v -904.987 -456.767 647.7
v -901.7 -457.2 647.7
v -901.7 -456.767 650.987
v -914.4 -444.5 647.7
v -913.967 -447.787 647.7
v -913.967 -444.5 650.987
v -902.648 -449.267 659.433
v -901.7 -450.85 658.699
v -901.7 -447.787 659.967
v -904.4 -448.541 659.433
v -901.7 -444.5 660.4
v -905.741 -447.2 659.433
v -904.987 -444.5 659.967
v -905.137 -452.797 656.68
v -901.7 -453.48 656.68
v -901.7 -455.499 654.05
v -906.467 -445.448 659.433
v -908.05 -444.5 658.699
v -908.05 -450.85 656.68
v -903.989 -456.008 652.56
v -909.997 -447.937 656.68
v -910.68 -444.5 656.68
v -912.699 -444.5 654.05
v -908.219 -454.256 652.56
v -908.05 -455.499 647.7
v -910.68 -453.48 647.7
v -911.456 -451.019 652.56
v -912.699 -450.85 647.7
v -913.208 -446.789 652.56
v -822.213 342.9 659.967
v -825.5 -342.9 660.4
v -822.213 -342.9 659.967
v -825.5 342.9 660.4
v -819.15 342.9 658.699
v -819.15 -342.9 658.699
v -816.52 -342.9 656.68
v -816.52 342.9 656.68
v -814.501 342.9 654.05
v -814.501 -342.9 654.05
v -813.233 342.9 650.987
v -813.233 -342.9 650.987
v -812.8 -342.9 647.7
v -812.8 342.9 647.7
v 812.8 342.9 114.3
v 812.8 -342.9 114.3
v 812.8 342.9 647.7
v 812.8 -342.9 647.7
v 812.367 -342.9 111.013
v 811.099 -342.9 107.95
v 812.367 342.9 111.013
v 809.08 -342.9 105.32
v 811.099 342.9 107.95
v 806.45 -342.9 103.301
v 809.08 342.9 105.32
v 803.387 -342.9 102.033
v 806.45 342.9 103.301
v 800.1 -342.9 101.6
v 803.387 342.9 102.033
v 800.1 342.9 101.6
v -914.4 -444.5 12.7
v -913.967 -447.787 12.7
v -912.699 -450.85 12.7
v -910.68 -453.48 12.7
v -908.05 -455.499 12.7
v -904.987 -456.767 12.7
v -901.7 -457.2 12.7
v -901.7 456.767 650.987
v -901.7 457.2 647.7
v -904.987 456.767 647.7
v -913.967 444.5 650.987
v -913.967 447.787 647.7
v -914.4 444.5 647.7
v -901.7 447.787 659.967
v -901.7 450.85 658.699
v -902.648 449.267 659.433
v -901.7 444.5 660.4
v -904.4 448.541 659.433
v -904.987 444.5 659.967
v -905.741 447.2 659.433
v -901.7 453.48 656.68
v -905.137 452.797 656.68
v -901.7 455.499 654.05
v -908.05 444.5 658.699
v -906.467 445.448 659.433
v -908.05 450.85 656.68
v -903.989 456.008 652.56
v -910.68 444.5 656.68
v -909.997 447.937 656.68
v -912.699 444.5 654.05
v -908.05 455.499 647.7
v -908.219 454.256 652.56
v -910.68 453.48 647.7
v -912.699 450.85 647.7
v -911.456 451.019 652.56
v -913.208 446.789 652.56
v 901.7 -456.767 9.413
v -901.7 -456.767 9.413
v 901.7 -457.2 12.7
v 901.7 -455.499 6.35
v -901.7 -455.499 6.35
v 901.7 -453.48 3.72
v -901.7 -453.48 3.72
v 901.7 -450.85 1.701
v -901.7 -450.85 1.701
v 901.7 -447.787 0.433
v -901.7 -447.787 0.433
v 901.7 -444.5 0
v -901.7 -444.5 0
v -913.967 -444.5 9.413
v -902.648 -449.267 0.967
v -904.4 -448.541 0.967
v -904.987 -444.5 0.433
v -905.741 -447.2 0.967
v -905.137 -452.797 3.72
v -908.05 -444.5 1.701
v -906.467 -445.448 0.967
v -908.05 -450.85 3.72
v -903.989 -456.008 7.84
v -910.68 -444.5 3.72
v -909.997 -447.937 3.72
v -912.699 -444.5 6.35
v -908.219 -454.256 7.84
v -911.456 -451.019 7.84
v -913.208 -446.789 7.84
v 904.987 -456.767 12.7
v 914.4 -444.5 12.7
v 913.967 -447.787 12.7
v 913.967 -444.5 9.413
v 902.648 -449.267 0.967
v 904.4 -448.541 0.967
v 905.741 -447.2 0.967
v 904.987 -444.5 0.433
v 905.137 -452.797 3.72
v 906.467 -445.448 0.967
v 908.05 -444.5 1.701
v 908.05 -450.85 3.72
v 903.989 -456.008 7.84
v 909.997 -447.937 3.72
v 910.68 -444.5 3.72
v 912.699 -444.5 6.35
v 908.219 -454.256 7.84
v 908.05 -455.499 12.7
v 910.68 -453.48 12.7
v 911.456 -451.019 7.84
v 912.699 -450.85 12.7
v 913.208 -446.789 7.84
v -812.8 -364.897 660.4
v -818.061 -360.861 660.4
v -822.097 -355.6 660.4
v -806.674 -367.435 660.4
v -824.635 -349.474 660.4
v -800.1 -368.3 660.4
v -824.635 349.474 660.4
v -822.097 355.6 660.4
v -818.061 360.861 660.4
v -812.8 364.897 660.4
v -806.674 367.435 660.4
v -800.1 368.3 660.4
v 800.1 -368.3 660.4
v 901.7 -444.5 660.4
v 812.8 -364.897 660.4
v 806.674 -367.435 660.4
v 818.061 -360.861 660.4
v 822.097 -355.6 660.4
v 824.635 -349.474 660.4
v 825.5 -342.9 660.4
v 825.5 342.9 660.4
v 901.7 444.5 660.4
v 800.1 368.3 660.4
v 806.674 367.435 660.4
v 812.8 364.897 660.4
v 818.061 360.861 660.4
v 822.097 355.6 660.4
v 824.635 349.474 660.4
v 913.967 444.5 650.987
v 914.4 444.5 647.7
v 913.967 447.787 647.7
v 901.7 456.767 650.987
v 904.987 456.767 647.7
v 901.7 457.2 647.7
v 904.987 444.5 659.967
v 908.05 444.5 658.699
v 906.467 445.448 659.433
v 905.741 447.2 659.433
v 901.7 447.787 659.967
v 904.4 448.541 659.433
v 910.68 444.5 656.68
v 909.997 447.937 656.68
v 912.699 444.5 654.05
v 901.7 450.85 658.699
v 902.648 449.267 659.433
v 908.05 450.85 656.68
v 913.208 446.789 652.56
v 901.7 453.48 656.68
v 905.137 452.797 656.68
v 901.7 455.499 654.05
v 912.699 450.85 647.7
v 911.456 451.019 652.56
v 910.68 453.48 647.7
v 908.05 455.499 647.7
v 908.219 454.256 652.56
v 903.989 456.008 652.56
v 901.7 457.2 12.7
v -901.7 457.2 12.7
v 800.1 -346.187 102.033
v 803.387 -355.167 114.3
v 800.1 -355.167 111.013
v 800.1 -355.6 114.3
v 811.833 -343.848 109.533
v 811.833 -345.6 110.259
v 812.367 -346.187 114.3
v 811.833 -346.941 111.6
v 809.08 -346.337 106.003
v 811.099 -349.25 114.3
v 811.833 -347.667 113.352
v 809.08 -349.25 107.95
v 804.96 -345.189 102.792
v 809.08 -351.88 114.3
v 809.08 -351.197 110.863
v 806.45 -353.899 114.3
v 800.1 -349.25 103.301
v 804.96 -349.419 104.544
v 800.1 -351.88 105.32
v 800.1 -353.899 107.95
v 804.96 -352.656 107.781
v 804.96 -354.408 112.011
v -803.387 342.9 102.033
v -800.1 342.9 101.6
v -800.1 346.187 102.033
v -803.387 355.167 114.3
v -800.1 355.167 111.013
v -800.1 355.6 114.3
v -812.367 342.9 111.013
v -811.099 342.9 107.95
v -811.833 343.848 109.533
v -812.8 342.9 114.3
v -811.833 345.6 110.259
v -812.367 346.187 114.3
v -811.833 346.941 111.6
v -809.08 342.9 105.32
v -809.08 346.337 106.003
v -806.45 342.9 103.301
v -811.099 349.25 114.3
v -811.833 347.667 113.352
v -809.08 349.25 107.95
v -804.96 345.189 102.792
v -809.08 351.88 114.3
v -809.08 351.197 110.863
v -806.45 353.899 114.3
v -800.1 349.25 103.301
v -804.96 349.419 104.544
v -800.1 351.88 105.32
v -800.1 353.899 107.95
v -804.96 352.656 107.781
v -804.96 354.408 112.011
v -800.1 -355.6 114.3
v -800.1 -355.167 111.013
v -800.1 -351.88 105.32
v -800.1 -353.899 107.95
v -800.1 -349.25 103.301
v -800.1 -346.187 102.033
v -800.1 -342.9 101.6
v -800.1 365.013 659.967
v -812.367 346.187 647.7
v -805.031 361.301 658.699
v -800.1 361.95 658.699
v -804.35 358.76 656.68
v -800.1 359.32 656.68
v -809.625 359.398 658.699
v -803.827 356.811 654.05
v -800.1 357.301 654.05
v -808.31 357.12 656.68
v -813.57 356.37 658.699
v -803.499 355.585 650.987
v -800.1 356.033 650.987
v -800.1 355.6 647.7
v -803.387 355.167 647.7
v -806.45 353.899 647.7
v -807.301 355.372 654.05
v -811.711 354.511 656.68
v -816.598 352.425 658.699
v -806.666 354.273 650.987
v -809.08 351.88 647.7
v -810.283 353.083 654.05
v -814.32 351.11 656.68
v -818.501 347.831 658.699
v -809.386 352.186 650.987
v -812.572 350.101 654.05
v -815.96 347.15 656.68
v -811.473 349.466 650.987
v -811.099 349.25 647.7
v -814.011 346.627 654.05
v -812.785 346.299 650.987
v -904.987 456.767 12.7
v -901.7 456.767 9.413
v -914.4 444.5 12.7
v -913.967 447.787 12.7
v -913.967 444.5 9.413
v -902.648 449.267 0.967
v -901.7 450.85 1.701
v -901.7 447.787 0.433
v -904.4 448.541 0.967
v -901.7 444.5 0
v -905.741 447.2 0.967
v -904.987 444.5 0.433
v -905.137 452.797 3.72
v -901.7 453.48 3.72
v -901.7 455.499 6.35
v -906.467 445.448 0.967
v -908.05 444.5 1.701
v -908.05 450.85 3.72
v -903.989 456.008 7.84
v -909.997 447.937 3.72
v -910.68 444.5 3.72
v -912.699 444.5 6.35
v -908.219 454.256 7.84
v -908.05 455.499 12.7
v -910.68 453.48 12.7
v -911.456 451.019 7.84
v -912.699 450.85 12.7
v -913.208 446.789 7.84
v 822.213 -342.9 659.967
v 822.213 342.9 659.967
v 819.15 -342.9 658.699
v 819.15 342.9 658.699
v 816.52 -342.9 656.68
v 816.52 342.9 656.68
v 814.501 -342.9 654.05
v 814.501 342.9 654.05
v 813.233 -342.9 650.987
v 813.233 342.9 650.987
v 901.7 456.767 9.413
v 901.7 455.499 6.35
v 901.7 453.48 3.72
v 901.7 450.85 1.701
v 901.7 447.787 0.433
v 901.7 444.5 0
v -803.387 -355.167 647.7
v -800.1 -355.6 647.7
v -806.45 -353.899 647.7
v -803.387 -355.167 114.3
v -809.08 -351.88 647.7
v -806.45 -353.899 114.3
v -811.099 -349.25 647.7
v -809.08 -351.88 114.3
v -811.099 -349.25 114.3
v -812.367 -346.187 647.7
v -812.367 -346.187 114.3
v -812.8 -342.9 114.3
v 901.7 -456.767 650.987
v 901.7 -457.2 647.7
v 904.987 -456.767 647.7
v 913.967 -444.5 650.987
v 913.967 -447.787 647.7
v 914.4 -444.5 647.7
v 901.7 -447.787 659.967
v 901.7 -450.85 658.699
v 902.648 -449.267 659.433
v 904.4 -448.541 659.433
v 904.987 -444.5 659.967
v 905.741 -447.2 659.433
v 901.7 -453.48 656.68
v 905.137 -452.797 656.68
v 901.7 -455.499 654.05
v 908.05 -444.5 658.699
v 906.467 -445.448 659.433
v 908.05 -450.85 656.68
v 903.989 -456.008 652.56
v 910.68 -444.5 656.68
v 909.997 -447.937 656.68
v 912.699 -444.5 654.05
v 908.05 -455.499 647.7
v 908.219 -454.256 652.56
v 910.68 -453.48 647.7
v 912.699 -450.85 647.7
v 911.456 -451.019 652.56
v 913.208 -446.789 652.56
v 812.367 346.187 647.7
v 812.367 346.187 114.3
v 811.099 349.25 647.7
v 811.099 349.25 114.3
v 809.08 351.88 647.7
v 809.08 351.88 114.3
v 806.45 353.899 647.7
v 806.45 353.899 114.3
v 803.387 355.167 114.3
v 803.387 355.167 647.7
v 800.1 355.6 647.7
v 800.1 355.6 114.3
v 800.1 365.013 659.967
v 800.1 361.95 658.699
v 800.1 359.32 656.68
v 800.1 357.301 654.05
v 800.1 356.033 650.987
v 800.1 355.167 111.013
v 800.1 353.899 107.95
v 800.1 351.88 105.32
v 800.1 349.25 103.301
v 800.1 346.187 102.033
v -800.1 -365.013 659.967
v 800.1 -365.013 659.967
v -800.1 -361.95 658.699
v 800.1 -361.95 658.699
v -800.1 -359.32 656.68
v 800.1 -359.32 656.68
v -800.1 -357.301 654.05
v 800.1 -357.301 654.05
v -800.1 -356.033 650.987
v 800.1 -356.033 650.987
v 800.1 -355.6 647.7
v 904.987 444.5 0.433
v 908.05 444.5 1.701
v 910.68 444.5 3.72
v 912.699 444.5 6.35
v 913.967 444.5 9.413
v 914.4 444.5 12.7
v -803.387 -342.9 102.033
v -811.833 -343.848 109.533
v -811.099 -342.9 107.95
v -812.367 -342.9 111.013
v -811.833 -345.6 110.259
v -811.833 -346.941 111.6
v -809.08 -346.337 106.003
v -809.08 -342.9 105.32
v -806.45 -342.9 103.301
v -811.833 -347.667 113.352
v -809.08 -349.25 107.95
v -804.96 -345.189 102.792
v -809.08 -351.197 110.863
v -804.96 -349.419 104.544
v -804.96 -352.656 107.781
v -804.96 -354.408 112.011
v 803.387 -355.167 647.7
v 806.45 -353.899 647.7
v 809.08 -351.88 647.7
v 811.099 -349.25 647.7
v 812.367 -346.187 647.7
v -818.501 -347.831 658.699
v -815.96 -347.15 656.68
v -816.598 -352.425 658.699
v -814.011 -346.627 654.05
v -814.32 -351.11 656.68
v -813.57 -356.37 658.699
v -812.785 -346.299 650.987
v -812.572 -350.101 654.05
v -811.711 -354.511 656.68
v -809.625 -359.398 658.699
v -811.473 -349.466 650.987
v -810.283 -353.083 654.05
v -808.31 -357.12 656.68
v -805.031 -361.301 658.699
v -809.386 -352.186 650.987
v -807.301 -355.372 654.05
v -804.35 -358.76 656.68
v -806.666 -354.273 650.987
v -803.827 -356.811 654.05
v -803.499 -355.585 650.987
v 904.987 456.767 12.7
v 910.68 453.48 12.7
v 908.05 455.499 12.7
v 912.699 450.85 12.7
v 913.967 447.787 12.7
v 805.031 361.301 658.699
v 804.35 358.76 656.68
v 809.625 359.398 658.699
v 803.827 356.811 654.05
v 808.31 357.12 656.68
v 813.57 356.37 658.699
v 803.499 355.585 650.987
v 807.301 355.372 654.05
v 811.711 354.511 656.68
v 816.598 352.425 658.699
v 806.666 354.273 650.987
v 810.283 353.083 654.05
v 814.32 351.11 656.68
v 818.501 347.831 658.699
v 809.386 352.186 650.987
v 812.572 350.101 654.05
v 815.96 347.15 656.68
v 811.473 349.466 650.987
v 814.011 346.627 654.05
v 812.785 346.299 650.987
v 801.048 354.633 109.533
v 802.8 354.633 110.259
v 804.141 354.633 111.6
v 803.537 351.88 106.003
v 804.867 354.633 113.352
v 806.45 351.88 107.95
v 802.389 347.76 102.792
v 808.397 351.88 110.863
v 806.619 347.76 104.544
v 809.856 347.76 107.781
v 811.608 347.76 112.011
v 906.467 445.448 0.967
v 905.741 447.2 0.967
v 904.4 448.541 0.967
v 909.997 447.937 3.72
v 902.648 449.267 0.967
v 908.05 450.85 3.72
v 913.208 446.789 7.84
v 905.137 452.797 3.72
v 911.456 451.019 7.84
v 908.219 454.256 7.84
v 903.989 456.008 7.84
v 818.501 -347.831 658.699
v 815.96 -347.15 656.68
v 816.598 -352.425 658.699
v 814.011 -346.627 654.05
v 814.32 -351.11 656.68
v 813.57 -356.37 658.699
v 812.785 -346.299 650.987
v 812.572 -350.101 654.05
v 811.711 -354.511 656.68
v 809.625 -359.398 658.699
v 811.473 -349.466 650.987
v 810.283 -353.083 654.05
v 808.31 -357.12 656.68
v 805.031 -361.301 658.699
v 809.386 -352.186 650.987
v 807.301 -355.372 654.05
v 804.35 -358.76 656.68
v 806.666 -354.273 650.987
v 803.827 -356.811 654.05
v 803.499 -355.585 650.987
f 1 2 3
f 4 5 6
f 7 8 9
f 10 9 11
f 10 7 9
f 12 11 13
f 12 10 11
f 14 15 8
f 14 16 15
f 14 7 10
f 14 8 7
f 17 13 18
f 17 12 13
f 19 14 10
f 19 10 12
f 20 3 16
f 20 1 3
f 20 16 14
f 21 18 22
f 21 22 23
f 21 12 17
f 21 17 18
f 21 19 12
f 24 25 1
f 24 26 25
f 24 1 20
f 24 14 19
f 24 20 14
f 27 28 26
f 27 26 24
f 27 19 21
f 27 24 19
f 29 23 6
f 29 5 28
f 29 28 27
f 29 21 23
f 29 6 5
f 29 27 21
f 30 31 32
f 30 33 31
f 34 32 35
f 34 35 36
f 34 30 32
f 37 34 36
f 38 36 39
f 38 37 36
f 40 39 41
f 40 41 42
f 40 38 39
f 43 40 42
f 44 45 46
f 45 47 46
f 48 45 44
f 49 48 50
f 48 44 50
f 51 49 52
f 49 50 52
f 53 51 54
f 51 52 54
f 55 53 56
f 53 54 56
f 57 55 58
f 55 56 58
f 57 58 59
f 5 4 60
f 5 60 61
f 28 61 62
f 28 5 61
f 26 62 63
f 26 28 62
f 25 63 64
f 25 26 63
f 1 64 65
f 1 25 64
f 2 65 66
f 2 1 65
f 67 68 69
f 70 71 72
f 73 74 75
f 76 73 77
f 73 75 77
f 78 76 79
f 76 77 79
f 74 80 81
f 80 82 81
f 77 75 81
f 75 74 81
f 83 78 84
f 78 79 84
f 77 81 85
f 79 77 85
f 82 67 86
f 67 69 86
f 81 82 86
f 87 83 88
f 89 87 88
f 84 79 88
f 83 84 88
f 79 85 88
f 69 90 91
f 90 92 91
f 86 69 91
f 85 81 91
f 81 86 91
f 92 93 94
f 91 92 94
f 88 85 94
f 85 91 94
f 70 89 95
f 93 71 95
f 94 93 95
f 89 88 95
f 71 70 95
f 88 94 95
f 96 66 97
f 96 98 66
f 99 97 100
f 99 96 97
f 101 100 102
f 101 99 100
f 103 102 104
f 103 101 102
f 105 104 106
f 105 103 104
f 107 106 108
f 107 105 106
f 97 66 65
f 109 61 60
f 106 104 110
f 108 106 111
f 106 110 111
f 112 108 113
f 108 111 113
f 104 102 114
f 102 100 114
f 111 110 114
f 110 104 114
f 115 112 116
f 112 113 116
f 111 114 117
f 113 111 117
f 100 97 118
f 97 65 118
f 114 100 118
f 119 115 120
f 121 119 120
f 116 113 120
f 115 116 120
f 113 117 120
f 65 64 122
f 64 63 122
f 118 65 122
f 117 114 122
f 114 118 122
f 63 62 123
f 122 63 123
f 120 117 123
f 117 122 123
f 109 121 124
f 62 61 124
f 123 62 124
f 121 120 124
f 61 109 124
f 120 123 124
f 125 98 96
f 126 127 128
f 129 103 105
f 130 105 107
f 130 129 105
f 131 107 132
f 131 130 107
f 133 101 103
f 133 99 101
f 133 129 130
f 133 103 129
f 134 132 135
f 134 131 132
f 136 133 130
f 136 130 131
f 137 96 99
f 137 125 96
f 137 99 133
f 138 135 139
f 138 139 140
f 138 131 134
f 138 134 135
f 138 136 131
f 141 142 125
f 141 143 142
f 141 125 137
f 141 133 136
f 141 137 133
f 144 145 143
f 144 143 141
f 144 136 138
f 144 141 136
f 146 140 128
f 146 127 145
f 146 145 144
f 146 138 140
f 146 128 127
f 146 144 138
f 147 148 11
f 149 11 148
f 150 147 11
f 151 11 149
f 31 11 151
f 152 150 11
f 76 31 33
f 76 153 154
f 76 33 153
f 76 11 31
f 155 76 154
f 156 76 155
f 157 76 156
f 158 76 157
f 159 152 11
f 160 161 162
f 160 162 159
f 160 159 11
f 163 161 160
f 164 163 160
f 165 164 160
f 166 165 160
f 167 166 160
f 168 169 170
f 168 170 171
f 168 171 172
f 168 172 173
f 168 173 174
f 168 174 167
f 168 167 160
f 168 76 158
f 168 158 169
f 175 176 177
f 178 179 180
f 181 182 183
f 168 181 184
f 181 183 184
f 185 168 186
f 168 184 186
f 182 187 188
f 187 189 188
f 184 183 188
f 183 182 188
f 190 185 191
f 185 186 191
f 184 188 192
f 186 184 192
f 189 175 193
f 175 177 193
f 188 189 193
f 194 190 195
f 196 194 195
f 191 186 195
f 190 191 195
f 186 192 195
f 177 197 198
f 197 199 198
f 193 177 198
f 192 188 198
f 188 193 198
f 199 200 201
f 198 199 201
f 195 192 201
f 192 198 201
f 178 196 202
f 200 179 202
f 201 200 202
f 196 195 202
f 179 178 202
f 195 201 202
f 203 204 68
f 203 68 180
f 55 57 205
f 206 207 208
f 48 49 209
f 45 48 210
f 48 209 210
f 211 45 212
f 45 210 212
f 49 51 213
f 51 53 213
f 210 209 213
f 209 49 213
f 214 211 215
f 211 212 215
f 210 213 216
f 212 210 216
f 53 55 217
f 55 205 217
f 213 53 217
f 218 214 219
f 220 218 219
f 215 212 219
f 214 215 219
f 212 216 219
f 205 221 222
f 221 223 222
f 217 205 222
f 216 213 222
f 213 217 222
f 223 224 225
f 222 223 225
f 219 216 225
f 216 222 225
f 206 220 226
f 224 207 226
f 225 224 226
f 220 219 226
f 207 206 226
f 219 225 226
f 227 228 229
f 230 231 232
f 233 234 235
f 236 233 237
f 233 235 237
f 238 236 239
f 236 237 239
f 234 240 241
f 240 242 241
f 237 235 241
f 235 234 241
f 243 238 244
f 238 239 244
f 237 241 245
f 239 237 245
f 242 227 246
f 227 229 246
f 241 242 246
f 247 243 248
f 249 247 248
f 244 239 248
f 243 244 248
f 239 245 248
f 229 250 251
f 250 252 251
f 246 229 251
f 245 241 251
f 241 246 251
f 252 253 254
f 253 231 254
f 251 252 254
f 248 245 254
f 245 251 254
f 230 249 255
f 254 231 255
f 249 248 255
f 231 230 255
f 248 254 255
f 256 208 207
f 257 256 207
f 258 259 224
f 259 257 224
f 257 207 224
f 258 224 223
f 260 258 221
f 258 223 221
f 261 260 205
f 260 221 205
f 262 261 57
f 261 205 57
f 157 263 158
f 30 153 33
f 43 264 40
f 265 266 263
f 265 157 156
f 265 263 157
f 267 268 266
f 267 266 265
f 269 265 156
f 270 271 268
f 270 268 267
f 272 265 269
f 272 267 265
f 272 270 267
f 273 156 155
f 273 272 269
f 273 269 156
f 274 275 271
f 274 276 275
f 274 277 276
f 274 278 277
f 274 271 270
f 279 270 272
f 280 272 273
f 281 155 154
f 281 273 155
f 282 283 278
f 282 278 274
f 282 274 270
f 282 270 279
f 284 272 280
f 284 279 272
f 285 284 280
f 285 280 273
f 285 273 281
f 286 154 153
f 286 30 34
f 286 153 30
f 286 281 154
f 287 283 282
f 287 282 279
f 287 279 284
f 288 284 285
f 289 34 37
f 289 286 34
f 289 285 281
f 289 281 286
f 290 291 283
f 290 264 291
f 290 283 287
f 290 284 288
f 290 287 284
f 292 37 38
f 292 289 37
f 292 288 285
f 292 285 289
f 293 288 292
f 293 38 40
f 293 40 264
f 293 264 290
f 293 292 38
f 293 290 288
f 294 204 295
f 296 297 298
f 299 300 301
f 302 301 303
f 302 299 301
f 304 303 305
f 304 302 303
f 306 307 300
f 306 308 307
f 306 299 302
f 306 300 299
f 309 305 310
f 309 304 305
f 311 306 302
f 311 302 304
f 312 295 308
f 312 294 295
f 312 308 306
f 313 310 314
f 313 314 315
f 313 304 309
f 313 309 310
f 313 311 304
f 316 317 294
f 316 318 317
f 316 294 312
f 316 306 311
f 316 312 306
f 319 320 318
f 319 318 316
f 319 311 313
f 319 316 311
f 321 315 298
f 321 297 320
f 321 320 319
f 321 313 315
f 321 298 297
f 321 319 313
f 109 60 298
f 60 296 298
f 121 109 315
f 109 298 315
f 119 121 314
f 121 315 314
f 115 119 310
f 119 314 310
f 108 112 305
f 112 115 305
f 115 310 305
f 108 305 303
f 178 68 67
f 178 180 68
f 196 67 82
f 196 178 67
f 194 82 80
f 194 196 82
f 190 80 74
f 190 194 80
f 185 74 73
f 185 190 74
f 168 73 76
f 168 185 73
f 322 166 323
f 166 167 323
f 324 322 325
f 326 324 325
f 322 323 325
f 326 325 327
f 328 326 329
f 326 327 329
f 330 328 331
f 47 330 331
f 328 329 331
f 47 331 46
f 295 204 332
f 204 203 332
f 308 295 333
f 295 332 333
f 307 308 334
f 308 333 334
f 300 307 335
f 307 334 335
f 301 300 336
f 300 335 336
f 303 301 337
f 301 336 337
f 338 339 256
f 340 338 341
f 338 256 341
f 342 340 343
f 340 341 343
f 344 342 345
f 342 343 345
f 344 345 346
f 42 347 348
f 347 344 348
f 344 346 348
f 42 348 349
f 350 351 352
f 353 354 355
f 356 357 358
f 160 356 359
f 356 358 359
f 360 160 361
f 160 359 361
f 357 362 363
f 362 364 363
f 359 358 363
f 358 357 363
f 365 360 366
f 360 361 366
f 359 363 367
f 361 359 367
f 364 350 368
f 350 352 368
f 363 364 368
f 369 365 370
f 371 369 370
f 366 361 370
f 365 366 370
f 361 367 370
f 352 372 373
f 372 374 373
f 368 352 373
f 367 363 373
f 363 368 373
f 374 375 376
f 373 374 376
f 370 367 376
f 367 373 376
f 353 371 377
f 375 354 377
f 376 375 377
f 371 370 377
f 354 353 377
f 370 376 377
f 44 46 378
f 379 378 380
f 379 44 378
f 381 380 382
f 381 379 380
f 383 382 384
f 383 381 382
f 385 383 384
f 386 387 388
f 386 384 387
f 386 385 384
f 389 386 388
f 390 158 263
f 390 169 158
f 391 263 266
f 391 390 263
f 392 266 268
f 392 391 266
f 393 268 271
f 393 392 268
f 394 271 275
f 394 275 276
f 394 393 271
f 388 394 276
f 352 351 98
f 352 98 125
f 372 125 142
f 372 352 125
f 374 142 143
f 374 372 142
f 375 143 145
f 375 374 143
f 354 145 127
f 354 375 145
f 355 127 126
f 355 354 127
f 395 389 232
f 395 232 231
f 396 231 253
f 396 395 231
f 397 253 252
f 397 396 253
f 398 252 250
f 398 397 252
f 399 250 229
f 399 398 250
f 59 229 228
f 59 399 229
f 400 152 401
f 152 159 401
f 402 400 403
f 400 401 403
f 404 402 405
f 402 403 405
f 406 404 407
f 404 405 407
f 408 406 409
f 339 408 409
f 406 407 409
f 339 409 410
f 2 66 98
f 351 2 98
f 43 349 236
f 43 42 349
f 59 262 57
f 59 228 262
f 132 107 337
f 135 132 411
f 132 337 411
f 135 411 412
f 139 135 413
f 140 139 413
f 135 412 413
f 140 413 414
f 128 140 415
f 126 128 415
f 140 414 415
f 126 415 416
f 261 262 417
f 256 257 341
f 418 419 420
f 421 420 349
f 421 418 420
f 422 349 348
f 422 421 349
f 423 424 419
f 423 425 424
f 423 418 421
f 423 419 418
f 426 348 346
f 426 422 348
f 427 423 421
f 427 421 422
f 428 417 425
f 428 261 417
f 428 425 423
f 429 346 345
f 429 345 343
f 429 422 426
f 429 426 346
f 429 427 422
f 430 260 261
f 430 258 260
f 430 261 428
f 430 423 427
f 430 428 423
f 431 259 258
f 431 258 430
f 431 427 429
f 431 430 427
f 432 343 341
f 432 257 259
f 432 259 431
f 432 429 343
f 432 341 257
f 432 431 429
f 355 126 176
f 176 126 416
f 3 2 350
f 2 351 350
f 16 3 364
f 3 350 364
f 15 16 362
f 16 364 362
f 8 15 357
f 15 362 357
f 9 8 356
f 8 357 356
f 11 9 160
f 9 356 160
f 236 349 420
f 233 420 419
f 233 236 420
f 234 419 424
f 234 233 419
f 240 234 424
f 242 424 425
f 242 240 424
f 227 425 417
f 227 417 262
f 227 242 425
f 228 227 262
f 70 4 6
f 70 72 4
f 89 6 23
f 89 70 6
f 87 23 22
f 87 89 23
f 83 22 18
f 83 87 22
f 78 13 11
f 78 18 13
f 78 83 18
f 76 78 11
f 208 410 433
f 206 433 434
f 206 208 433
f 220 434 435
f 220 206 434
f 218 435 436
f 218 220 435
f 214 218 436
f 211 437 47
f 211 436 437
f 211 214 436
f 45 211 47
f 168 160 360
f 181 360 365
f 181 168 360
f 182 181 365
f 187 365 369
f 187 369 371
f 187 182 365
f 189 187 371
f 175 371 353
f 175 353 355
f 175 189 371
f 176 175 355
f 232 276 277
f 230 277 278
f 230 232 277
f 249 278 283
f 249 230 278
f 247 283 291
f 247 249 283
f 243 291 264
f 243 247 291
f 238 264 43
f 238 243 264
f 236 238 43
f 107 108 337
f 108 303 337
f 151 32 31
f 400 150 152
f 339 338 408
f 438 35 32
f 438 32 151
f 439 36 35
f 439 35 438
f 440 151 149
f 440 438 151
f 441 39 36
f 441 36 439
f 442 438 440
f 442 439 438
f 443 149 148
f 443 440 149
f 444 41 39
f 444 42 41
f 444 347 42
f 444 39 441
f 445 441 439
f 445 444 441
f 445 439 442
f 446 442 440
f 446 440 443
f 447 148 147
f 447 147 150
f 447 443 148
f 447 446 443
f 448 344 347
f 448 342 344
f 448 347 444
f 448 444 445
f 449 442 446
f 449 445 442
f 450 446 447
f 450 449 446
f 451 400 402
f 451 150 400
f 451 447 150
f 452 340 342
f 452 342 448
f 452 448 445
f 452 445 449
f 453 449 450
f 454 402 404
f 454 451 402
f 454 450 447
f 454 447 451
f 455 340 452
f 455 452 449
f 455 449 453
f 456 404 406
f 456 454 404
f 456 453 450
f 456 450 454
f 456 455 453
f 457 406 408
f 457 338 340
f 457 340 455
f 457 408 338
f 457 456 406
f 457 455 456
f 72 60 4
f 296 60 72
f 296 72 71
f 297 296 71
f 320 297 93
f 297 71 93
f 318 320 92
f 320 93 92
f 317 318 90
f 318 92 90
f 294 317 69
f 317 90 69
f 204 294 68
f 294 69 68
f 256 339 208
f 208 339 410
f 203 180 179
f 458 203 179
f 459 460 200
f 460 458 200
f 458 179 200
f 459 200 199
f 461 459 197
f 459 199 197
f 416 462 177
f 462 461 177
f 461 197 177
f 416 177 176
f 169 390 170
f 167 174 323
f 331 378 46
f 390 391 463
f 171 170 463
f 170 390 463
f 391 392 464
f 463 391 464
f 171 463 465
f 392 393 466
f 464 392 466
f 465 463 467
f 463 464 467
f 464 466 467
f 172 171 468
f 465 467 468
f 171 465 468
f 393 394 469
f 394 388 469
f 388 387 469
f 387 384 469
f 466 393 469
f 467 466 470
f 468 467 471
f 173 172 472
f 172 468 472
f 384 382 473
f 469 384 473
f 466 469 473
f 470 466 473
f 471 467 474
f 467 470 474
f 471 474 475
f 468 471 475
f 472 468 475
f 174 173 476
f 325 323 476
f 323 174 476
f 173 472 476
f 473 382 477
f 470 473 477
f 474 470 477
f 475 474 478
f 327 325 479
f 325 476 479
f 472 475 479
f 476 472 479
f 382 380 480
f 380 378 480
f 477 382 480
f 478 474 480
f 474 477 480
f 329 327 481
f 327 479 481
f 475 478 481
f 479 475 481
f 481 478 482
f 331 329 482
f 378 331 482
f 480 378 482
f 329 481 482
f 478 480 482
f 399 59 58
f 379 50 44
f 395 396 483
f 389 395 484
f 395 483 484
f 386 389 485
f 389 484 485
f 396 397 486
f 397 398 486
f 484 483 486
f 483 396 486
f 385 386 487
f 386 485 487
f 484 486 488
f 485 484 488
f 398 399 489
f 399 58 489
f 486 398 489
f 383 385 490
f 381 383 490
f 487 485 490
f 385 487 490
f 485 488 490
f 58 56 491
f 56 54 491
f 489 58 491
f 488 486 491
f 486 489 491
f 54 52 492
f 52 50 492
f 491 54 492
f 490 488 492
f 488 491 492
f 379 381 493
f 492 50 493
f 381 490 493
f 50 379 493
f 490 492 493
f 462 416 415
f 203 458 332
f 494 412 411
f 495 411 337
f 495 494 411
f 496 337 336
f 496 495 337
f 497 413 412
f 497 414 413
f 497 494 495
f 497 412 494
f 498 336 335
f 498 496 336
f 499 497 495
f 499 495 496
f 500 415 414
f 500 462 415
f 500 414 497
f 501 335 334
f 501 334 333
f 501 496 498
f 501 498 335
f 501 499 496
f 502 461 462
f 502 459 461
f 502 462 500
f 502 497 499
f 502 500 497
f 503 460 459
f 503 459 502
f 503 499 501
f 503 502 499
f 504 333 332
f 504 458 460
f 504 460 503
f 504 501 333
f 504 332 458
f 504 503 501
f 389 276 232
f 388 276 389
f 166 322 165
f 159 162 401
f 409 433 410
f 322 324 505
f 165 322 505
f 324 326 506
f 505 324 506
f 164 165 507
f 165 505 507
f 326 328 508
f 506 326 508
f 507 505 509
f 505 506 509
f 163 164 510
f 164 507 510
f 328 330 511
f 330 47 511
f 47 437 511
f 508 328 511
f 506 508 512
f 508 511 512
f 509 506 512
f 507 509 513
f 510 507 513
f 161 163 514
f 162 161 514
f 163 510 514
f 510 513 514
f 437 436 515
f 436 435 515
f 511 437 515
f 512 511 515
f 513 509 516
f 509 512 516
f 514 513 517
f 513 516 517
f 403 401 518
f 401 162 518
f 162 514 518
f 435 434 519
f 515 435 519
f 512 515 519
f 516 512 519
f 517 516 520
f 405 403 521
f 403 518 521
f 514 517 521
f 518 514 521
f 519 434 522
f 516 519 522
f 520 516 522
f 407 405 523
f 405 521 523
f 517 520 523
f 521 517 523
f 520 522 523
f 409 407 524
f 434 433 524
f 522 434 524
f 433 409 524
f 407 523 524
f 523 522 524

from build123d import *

# Parameters (mm, degrees)
F0_W     = 1828.8
F0_H     = 914.4
F1_DEPTH = 660.4
F2_W     = 1625.6
F2_H     = 711.2
F3_DEPTH = 558.8
F4_R     = 12.7


with BuildPart() as f1:
    # F0 (on Top) → F1 (new body)
    with BuildSketch(Plane.XY):
        Rectangle(F0_W, F0_H)
    extrude(amount=F1_DEPTH)

    # F2 (on face) → F3 (cut)
    with BuildSketch(Plane.XY.offset(660.4)):
        Rectangle(F2_W, F2_H)
    extrude(amount=-F3_DEPTH, mode=Mode.SUBTRACT)

    # F4
    f4_edges = [f1.edges().sort_by_distance(p)[0] for p in [
        (0, -355.6, 101.6),
        (812.8, 0, 101.6),
        (0, 355.6, 101.6),
        (-812.8, 0, 101.6),
        (812.8, 355.6, 381),
        (-812.8, 355.6, 381),
        (0, 355.6, 660.4),
        (-812.8, -355.6, 381),
        (-812.8, 0, 660.4),
        (812.8, -355.6, 381),
        (812.8, 0, 660.4),
        (0, -355.6, 660.4),
        (-914.4, -457.2, 330.2),
        (914.4, -457.2, 330.2),
        (0, -457.2, 0),
        (0, -457.2, 660.4),
        (914.4, 457.2, 330.2),
        (914.4, 0, 0),
        (914.4, 0, 660.4),
        (-914.4, 457.2, 330.2),
        (0, 457.2, 0),
        (0, 457.2, 660.4),
        (-914.4, 0, 0),
        (-914.4, 0, 660.4),
    ]]
    fillet(f4_edges, radius=F4_R)


solid = f1.part
